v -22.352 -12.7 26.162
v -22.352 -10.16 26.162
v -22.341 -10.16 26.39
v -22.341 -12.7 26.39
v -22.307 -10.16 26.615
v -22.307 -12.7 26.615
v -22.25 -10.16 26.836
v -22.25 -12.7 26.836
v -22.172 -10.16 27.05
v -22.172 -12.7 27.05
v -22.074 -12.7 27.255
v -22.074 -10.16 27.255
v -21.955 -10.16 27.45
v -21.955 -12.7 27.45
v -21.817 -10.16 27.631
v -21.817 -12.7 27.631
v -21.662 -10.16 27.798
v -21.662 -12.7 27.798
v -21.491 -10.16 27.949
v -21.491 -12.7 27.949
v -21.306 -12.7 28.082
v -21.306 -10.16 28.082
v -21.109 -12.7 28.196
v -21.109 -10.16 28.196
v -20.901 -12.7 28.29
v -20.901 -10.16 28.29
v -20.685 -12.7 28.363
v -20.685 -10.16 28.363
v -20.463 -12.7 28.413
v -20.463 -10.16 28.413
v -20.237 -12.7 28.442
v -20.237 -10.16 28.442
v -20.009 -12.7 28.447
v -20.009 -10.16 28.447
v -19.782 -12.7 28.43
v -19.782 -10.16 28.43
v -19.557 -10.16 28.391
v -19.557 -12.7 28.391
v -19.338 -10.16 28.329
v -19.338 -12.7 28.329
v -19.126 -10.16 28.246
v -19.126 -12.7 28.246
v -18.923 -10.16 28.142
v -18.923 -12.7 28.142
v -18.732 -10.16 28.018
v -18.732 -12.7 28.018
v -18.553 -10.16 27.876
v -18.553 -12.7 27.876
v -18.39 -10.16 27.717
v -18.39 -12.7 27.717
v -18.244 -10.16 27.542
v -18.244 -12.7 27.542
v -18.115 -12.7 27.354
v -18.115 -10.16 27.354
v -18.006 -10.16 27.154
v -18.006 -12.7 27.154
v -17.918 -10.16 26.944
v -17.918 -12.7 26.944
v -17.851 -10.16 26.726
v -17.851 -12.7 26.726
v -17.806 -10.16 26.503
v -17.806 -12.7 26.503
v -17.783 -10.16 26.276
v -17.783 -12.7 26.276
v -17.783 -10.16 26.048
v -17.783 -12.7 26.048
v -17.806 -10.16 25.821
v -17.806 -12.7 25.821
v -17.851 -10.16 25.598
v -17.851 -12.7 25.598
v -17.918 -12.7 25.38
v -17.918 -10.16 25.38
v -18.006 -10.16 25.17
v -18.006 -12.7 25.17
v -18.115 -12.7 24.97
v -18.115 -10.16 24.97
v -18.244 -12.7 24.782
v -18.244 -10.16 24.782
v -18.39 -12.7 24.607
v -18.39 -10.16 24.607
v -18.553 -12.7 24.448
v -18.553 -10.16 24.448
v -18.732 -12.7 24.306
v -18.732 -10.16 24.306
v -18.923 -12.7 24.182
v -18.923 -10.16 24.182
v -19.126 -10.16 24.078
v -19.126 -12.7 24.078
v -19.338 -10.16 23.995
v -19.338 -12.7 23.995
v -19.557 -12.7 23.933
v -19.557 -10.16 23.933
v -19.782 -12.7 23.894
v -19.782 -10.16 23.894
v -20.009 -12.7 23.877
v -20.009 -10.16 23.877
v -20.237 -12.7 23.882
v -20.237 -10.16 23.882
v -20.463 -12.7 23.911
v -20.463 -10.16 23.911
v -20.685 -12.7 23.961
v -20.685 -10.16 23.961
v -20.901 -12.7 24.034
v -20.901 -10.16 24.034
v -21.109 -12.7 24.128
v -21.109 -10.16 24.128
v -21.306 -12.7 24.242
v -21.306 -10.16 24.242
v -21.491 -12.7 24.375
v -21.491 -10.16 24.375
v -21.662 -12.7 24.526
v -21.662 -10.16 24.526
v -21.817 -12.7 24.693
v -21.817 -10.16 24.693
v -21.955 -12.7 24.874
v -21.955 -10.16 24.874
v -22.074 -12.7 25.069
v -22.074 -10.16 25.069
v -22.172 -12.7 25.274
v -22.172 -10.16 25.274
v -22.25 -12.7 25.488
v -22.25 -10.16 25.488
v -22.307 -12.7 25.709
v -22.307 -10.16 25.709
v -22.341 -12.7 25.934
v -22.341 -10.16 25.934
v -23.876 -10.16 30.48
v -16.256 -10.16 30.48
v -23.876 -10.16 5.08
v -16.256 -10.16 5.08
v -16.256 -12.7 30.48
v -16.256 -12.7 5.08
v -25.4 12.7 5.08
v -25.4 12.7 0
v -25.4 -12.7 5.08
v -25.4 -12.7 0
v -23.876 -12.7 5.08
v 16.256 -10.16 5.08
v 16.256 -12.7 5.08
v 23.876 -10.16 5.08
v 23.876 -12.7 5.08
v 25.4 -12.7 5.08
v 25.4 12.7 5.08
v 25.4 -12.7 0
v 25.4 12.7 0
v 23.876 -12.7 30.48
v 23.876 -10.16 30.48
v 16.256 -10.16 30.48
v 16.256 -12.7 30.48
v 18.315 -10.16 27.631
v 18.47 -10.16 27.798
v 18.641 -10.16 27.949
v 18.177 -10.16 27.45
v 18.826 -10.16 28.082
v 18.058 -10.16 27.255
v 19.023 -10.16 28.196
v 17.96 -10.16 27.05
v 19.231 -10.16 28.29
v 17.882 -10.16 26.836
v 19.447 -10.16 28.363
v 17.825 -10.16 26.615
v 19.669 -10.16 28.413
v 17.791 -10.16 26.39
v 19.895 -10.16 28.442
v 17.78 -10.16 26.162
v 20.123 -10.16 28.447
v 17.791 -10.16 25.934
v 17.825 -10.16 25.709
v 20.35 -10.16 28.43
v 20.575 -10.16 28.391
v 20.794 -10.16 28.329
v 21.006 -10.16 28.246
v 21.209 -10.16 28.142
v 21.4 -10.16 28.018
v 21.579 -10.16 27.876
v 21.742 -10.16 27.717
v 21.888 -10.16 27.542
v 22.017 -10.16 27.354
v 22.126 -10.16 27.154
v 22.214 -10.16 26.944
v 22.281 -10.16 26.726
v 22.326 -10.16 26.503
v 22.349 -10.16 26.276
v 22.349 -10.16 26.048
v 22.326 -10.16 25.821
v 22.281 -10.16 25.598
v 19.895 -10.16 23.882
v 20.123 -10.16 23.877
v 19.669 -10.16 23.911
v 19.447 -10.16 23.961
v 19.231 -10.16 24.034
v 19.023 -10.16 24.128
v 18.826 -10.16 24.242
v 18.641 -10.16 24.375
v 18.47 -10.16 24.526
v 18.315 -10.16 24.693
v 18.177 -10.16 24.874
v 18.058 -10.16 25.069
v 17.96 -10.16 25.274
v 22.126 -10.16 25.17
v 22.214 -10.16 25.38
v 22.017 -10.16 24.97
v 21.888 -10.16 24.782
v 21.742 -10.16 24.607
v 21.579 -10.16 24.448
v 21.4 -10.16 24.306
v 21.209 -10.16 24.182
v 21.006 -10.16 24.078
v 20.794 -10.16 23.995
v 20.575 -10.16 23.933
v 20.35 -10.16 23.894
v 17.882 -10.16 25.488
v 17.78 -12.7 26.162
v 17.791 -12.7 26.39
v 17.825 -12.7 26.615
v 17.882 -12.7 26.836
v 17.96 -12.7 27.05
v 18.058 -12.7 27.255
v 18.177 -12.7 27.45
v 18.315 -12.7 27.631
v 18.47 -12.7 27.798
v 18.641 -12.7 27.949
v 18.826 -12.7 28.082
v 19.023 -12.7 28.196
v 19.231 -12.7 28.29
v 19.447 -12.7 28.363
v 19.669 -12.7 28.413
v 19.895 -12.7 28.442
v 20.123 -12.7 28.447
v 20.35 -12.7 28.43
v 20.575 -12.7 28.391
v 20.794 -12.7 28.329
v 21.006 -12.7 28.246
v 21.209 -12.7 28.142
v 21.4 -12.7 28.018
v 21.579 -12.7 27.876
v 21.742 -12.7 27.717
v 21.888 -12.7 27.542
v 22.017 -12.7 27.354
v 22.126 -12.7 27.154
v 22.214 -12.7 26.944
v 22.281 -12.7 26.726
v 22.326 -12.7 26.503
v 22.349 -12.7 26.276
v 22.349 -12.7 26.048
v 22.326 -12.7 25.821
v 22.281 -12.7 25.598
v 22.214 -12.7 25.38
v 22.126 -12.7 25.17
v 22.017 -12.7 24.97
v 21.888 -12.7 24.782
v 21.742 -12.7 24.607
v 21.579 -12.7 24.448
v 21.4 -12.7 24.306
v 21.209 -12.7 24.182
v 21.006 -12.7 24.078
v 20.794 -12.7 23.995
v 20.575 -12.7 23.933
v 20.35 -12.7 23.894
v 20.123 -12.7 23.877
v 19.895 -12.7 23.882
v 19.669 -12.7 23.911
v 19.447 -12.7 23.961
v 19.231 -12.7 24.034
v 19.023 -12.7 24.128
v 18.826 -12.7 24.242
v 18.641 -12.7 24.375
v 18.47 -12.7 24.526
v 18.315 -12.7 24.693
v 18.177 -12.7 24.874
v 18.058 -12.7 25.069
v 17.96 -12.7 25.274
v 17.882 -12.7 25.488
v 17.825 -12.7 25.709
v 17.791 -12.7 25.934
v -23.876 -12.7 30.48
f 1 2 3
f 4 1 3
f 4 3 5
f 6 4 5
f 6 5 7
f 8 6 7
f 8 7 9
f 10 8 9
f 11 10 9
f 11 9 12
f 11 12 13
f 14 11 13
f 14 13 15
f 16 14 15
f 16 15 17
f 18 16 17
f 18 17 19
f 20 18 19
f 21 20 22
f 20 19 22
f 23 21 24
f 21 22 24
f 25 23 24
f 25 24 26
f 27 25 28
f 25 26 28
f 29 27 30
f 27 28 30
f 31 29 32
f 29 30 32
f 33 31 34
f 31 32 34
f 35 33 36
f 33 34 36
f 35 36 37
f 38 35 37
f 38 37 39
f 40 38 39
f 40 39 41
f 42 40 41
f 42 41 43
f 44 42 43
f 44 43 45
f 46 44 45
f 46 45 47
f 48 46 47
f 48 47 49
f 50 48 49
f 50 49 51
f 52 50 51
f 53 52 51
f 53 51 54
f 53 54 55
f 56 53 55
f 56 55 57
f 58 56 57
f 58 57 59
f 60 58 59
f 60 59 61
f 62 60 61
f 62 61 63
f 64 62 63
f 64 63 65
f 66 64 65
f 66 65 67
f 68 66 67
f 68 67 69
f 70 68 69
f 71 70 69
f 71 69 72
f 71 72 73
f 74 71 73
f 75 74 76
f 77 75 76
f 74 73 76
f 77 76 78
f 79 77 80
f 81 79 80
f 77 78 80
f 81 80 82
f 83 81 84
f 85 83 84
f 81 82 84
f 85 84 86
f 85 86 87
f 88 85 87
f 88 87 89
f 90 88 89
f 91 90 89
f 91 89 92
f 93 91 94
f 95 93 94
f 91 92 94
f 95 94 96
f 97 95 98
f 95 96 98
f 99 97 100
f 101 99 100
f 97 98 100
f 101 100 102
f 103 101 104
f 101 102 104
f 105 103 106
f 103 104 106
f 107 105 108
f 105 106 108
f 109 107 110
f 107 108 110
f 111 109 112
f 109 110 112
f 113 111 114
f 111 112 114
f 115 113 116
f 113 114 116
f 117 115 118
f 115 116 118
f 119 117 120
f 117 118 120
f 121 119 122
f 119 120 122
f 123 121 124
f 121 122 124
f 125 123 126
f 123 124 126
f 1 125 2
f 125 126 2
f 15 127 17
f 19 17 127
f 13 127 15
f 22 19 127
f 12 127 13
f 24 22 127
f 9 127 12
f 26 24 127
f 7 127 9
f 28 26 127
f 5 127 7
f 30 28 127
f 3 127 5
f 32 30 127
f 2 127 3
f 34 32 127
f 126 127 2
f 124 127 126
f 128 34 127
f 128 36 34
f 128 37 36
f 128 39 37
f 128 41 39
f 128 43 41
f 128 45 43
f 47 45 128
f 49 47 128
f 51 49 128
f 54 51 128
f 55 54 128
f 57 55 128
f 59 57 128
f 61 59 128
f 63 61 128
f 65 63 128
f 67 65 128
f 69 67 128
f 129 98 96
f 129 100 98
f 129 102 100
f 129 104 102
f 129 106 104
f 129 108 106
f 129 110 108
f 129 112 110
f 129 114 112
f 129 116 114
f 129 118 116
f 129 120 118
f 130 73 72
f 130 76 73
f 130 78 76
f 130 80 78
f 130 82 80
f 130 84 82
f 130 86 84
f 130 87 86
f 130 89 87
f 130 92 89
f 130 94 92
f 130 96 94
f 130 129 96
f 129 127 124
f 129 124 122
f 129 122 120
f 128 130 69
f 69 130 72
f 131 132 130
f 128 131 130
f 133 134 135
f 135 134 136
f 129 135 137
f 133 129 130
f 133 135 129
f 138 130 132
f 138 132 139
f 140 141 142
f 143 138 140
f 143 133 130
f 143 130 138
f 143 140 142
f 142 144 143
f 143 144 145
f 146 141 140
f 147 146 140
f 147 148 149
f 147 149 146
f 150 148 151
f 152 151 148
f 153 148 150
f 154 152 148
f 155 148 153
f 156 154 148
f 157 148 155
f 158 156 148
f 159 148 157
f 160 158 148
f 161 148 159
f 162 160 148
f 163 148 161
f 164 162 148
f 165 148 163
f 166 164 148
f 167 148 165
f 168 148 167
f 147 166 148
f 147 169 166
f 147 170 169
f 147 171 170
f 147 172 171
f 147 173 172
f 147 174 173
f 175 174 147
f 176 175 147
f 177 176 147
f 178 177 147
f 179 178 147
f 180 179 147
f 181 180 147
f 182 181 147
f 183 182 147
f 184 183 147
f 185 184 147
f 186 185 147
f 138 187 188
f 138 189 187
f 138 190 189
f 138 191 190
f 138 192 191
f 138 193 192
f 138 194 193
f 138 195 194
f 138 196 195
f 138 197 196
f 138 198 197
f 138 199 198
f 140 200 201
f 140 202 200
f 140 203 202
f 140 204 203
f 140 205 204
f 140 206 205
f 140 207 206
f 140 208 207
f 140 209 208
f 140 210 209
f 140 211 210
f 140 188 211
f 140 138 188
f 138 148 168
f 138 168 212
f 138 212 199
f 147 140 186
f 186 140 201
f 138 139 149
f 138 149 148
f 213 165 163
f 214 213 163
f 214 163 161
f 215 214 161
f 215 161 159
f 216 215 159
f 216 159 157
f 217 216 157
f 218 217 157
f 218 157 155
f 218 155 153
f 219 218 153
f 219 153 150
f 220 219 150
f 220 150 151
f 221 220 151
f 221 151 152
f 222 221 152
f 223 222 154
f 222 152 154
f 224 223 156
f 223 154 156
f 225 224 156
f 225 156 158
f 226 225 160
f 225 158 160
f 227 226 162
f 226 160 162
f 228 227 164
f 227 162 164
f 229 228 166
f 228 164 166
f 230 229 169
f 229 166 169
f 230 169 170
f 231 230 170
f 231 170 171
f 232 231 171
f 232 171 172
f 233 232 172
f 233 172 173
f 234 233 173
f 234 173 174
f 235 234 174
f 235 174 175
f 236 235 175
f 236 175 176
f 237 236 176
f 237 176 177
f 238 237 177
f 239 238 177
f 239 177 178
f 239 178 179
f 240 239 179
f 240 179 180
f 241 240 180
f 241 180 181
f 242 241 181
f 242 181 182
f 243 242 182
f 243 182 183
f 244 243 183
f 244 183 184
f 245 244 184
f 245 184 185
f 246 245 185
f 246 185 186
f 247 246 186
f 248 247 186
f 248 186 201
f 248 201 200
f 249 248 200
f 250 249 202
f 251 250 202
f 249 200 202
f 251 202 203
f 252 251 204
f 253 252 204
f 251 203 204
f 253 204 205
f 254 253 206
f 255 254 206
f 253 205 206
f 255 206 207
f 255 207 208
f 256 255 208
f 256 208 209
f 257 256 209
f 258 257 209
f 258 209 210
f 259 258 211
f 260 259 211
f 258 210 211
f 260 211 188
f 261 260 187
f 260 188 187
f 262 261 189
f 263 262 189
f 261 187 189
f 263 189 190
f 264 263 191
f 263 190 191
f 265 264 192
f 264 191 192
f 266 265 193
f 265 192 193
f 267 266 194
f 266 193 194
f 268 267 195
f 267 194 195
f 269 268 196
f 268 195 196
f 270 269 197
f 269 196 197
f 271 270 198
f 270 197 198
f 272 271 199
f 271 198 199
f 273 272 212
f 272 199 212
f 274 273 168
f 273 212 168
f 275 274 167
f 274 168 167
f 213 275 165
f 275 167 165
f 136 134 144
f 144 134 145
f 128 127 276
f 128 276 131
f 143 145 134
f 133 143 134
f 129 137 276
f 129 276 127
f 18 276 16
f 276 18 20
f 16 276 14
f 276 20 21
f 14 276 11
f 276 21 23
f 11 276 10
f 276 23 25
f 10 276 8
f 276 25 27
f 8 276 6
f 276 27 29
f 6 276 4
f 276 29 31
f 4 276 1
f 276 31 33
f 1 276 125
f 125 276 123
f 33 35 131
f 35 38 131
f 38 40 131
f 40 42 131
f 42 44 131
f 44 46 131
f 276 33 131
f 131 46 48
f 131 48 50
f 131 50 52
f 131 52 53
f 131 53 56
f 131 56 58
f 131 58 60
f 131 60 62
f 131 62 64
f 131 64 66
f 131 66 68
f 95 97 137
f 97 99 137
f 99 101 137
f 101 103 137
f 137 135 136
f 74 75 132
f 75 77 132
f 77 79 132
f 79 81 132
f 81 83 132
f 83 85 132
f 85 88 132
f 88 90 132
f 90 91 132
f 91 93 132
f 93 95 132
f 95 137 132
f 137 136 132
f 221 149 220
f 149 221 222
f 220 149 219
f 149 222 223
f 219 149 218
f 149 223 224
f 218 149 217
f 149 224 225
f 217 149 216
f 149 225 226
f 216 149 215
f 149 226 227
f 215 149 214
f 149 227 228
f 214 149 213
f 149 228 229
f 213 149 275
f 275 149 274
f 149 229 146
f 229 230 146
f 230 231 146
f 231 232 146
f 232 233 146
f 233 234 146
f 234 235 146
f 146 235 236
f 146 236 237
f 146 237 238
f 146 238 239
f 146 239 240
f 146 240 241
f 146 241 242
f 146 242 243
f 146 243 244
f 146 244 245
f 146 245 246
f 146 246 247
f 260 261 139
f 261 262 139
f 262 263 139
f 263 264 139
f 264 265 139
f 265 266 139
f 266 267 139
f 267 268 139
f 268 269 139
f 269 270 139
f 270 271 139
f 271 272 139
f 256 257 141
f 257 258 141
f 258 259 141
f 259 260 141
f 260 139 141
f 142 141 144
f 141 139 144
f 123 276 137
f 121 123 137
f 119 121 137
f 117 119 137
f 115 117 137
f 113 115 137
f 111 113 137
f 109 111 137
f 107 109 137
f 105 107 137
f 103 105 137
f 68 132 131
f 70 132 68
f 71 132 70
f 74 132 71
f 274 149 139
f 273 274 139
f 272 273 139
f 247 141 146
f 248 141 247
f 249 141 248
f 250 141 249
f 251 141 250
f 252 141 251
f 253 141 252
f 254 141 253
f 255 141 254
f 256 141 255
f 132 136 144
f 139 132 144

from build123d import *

# Parameters (mm, degrees)
F1_DEPTH = 5.08
F0_W     = 7.62
F0_H     = 2.54
F2_DEPTH = 30.48
F3_R     = 2.286
F3_R_2   = 2.286002
F4_DEPTH = 7.112


with BuildPart() as f1:
    # F0 (on Top) → F1 (new body)
    with BuildSketch(Plane.XY):
        Polygon((25.4, 12.7), (-25.4, 12.7), (-25.4, -12.7), (-23.876, -12.7), (-23.876, -10.16), (-16.256, -10.16), (-16.256, -12.7), (16.256, -12.7), (16.256, -10.16), (23.876, -10.16), (23.876, -12.7), (25.4, -12.7), align=None)
    extrude(amount=F1_DEPTH)

    # F0 (on Top) → F2 (join)
    with BuildSketch(Plane.XY):
        with Locations((-20.066, -11.43)):
            Rectangle(F0_W, F0_H)
        with Locations((20.066, -11.43)):
            Rectangle(F0_W, F0_H)
    extrude(amount=F2_DEPTH)

    # F3 (on face) → F4 (cut)
    with BuildSketch(Plane(origin=(0, -10.16, 0), x_dir=(-1, 0, 0), z_dir=(0, 1, 0))):
        with Locations((-20.066, 26.162)):
            Circle(F3_R)
        with Locations((20.066, 26.162)):
            Circle(F3_R_2)
    extrude(amount=-F4_DEPTH, mode=Mode.SUBTRACT)


solid = f1.part
